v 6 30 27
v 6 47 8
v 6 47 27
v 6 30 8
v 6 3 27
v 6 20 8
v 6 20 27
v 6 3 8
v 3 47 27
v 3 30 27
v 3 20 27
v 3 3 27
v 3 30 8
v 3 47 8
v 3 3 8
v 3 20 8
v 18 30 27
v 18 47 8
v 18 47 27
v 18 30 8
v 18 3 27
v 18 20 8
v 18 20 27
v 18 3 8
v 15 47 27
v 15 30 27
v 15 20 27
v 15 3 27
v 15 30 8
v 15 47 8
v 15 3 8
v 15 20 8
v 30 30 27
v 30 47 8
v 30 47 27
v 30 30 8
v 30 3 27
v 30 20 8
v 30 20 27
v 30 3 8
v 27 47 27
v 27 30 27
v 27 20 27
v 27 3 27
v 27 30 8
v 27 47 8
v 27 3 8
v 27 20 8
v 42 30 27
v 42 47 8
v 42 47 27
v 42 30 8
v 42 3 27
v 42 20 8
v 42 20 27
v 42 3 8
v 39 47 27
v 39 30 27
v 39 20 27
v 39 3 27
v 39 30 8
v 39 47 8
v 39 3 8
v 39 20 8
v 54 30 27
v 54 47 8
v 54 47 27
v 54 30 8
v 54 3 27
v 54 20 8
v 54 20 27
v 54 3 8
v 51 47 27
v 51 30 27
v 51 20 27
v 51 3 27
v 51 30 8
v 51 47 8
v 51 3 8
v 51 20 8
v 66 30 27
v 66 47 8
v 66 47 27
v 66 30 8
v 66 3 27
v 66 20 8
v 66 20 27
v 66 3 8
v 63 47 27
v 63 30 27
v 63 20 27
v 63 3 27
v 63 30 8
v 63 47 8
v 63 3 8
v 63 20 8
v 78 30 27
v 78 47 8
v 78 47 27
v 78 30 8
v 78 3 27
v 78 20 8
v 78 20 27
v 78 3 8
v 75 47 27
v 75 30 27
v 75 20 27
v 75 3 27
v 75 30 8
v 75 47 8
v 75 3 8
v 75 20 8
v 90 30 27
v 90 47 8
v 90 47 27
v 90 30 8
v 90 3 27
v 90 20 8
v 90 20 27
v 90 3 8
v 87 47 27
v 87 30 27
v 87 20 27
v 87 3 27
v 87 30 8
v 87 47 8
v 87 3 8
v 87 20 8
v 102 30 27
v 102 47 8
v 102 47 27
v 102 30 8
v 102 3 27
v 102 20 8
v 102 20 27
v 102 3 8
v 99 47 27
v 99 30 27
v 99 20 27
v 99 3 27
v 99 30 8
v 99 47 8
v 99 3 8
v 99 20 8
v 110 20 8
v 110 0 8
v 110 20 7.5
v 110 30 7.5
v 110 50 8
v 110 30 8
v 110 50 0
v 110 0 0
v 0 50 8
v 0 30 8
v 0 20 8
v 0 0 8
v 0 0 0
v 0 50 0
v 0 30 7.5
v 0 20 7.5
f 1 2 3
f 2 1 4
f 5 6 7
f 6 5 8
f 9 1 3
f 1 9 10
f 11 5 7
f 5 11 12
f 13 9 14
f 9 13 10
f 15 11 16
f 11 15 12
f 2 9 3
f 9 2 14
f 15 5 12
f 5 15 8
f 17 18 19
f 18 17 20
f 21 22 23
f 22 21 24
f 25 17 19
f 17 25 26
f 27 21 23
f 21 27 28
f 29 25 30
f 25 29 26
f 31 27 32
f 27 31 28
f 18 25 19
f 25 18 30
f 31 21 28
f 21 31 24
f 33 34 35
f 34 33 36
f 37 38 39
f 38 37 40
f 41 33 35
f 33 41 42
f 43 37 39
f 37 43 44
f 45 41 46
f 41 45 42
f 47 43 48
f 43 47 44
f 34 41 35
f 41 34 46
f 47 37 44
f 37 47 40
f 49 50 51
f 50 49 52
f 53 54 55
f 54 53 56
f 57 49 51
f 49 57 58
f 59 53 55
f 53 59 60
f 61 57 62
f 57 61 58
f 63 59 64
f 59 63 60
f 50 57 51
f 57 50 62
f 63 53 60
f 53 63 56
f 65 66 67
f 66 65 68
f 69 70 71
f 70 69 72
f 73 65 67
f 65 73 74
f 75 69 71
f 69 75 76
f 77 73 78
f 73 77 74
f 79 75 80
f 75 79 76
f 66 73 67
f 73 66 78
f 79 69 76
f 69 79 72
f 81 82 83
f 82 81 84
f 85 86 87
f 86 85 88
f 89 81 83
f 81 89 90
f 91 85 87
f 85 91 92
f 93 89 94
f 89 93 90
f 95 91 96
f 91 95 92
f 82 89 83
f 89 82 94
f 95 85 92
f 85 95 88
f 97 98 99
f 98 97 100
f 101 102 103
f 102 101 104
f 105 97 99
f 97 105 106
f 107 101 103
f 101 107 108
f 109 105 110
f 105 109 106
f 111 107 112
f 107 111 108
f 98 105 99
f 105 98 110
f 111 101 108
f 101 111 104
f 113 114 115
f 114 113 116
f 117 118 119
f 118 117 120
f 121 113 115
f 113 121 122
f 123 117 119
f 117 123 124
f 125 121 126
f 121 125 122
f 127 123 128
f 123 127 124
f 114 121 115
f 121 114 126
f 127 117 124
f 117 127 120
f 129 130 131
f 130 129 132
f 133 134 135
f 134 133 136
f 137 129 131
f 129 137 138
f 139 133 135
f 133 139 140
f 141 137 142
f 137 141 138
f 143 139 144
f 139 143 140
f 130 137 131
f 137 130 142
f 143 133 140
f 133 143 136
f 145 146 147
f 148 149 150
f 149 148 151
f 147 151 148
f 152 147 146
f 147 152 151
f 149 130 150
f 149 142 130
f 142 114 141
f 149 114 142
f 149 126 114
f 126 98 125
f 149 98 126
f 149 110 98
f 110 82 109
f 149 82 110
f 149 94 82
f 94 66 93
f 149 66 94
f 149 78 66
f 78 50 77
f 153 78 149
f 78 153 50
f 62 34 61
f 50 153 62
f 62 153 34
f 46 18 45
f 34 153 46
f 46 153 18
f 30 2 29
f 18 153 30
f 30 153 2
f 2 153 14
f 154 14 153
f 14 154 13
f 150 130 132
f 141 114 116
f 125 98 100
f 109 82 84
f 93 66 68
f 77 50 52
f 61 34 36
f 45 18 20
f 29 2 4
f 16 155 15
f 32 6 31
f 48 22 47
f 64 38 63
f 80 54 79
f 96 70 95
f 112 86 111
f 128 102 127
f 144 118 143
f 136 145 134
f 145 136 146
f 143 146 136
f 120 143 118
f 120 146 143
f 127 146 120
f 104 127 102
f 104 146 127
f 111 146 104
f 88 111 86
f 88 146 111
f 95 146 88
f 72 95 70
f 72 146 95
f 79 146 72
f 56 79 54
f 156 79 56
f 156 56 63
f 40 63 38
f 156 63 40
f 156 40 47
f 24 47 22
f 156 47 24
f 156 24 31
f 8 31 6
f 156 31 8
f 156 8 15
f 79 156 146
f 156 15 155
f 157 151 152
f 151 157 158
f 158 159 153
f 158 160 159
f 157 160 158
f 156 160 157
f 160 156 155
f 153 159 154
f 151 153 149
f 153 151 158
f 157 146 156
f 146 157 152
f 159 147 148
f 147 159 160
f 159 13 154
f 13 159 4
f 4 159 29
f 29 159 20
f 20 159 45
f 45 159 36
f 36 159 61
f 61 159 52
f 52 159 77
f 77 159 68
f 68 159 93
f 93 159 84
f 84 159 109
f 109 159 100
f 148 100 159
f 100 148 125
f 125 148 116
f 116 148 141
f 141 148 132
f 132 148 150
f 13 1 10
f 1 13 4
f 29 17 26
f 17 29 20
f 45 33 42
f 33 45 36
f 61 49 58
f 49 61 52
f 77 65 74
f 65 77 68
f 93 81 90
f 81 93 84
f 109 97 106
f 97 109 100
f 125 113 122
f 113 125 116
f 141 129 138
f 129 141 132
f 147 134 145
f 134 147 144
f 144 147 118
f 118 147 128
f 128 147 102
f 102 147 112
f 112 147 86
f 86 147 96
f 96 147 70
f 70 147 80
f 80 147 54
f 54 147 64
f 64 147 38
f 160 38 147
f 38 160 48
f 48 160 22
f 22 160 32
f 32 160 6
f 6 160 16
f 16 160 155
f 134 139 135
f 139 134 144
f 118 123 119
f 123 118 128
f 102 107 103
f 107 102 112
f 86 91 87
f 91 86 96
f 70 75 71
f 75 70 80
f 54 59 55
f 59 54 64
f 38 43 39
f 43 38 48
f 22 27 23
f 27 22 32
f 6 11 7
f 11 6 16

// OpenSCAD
$fn = 32;

// ----------------------------------------------------------------------
// Heatsink: slotted fin block
// ----------------------------------------------------------------------

// --- parameters (mm) ---
base_l = 110;             // base length, X
base_w = 50;              // base width, Y
base_t = 8;               // base plate thickness
fin_h = 20;               // fin height above the base
fin_t = 3;                // fin thickness
edge = 3;                 // margin from the base ends
pitch = 12;               // fin pitch
slot_w = 10;              // central slot width, Y
fit_tol = 0.1;            // tolerance for press fits, mm
free_tol = 0.5;           // tolerance for clearance fits, mm

n_fins = floor((base_l - 2 * edge - fin_t) / pitch) + 1;  // fin count
total_h = base_t + fin_h - 1;  // overall height

difference() {
union() {
  cube([base_l, base_w, base_t]);
  for (i = [0 : n_fins - 1])
    translate([edge + i * pitch, edge, base_t - 1])
      cube([fin_t, base_w - 2 * edge, fin_h]);
}
  translate([-1, base_w / 2 - slot_w / 2, base_t - 0.5])
    cube([base_l + 2, slot_w, fin_h + 2]);
}
